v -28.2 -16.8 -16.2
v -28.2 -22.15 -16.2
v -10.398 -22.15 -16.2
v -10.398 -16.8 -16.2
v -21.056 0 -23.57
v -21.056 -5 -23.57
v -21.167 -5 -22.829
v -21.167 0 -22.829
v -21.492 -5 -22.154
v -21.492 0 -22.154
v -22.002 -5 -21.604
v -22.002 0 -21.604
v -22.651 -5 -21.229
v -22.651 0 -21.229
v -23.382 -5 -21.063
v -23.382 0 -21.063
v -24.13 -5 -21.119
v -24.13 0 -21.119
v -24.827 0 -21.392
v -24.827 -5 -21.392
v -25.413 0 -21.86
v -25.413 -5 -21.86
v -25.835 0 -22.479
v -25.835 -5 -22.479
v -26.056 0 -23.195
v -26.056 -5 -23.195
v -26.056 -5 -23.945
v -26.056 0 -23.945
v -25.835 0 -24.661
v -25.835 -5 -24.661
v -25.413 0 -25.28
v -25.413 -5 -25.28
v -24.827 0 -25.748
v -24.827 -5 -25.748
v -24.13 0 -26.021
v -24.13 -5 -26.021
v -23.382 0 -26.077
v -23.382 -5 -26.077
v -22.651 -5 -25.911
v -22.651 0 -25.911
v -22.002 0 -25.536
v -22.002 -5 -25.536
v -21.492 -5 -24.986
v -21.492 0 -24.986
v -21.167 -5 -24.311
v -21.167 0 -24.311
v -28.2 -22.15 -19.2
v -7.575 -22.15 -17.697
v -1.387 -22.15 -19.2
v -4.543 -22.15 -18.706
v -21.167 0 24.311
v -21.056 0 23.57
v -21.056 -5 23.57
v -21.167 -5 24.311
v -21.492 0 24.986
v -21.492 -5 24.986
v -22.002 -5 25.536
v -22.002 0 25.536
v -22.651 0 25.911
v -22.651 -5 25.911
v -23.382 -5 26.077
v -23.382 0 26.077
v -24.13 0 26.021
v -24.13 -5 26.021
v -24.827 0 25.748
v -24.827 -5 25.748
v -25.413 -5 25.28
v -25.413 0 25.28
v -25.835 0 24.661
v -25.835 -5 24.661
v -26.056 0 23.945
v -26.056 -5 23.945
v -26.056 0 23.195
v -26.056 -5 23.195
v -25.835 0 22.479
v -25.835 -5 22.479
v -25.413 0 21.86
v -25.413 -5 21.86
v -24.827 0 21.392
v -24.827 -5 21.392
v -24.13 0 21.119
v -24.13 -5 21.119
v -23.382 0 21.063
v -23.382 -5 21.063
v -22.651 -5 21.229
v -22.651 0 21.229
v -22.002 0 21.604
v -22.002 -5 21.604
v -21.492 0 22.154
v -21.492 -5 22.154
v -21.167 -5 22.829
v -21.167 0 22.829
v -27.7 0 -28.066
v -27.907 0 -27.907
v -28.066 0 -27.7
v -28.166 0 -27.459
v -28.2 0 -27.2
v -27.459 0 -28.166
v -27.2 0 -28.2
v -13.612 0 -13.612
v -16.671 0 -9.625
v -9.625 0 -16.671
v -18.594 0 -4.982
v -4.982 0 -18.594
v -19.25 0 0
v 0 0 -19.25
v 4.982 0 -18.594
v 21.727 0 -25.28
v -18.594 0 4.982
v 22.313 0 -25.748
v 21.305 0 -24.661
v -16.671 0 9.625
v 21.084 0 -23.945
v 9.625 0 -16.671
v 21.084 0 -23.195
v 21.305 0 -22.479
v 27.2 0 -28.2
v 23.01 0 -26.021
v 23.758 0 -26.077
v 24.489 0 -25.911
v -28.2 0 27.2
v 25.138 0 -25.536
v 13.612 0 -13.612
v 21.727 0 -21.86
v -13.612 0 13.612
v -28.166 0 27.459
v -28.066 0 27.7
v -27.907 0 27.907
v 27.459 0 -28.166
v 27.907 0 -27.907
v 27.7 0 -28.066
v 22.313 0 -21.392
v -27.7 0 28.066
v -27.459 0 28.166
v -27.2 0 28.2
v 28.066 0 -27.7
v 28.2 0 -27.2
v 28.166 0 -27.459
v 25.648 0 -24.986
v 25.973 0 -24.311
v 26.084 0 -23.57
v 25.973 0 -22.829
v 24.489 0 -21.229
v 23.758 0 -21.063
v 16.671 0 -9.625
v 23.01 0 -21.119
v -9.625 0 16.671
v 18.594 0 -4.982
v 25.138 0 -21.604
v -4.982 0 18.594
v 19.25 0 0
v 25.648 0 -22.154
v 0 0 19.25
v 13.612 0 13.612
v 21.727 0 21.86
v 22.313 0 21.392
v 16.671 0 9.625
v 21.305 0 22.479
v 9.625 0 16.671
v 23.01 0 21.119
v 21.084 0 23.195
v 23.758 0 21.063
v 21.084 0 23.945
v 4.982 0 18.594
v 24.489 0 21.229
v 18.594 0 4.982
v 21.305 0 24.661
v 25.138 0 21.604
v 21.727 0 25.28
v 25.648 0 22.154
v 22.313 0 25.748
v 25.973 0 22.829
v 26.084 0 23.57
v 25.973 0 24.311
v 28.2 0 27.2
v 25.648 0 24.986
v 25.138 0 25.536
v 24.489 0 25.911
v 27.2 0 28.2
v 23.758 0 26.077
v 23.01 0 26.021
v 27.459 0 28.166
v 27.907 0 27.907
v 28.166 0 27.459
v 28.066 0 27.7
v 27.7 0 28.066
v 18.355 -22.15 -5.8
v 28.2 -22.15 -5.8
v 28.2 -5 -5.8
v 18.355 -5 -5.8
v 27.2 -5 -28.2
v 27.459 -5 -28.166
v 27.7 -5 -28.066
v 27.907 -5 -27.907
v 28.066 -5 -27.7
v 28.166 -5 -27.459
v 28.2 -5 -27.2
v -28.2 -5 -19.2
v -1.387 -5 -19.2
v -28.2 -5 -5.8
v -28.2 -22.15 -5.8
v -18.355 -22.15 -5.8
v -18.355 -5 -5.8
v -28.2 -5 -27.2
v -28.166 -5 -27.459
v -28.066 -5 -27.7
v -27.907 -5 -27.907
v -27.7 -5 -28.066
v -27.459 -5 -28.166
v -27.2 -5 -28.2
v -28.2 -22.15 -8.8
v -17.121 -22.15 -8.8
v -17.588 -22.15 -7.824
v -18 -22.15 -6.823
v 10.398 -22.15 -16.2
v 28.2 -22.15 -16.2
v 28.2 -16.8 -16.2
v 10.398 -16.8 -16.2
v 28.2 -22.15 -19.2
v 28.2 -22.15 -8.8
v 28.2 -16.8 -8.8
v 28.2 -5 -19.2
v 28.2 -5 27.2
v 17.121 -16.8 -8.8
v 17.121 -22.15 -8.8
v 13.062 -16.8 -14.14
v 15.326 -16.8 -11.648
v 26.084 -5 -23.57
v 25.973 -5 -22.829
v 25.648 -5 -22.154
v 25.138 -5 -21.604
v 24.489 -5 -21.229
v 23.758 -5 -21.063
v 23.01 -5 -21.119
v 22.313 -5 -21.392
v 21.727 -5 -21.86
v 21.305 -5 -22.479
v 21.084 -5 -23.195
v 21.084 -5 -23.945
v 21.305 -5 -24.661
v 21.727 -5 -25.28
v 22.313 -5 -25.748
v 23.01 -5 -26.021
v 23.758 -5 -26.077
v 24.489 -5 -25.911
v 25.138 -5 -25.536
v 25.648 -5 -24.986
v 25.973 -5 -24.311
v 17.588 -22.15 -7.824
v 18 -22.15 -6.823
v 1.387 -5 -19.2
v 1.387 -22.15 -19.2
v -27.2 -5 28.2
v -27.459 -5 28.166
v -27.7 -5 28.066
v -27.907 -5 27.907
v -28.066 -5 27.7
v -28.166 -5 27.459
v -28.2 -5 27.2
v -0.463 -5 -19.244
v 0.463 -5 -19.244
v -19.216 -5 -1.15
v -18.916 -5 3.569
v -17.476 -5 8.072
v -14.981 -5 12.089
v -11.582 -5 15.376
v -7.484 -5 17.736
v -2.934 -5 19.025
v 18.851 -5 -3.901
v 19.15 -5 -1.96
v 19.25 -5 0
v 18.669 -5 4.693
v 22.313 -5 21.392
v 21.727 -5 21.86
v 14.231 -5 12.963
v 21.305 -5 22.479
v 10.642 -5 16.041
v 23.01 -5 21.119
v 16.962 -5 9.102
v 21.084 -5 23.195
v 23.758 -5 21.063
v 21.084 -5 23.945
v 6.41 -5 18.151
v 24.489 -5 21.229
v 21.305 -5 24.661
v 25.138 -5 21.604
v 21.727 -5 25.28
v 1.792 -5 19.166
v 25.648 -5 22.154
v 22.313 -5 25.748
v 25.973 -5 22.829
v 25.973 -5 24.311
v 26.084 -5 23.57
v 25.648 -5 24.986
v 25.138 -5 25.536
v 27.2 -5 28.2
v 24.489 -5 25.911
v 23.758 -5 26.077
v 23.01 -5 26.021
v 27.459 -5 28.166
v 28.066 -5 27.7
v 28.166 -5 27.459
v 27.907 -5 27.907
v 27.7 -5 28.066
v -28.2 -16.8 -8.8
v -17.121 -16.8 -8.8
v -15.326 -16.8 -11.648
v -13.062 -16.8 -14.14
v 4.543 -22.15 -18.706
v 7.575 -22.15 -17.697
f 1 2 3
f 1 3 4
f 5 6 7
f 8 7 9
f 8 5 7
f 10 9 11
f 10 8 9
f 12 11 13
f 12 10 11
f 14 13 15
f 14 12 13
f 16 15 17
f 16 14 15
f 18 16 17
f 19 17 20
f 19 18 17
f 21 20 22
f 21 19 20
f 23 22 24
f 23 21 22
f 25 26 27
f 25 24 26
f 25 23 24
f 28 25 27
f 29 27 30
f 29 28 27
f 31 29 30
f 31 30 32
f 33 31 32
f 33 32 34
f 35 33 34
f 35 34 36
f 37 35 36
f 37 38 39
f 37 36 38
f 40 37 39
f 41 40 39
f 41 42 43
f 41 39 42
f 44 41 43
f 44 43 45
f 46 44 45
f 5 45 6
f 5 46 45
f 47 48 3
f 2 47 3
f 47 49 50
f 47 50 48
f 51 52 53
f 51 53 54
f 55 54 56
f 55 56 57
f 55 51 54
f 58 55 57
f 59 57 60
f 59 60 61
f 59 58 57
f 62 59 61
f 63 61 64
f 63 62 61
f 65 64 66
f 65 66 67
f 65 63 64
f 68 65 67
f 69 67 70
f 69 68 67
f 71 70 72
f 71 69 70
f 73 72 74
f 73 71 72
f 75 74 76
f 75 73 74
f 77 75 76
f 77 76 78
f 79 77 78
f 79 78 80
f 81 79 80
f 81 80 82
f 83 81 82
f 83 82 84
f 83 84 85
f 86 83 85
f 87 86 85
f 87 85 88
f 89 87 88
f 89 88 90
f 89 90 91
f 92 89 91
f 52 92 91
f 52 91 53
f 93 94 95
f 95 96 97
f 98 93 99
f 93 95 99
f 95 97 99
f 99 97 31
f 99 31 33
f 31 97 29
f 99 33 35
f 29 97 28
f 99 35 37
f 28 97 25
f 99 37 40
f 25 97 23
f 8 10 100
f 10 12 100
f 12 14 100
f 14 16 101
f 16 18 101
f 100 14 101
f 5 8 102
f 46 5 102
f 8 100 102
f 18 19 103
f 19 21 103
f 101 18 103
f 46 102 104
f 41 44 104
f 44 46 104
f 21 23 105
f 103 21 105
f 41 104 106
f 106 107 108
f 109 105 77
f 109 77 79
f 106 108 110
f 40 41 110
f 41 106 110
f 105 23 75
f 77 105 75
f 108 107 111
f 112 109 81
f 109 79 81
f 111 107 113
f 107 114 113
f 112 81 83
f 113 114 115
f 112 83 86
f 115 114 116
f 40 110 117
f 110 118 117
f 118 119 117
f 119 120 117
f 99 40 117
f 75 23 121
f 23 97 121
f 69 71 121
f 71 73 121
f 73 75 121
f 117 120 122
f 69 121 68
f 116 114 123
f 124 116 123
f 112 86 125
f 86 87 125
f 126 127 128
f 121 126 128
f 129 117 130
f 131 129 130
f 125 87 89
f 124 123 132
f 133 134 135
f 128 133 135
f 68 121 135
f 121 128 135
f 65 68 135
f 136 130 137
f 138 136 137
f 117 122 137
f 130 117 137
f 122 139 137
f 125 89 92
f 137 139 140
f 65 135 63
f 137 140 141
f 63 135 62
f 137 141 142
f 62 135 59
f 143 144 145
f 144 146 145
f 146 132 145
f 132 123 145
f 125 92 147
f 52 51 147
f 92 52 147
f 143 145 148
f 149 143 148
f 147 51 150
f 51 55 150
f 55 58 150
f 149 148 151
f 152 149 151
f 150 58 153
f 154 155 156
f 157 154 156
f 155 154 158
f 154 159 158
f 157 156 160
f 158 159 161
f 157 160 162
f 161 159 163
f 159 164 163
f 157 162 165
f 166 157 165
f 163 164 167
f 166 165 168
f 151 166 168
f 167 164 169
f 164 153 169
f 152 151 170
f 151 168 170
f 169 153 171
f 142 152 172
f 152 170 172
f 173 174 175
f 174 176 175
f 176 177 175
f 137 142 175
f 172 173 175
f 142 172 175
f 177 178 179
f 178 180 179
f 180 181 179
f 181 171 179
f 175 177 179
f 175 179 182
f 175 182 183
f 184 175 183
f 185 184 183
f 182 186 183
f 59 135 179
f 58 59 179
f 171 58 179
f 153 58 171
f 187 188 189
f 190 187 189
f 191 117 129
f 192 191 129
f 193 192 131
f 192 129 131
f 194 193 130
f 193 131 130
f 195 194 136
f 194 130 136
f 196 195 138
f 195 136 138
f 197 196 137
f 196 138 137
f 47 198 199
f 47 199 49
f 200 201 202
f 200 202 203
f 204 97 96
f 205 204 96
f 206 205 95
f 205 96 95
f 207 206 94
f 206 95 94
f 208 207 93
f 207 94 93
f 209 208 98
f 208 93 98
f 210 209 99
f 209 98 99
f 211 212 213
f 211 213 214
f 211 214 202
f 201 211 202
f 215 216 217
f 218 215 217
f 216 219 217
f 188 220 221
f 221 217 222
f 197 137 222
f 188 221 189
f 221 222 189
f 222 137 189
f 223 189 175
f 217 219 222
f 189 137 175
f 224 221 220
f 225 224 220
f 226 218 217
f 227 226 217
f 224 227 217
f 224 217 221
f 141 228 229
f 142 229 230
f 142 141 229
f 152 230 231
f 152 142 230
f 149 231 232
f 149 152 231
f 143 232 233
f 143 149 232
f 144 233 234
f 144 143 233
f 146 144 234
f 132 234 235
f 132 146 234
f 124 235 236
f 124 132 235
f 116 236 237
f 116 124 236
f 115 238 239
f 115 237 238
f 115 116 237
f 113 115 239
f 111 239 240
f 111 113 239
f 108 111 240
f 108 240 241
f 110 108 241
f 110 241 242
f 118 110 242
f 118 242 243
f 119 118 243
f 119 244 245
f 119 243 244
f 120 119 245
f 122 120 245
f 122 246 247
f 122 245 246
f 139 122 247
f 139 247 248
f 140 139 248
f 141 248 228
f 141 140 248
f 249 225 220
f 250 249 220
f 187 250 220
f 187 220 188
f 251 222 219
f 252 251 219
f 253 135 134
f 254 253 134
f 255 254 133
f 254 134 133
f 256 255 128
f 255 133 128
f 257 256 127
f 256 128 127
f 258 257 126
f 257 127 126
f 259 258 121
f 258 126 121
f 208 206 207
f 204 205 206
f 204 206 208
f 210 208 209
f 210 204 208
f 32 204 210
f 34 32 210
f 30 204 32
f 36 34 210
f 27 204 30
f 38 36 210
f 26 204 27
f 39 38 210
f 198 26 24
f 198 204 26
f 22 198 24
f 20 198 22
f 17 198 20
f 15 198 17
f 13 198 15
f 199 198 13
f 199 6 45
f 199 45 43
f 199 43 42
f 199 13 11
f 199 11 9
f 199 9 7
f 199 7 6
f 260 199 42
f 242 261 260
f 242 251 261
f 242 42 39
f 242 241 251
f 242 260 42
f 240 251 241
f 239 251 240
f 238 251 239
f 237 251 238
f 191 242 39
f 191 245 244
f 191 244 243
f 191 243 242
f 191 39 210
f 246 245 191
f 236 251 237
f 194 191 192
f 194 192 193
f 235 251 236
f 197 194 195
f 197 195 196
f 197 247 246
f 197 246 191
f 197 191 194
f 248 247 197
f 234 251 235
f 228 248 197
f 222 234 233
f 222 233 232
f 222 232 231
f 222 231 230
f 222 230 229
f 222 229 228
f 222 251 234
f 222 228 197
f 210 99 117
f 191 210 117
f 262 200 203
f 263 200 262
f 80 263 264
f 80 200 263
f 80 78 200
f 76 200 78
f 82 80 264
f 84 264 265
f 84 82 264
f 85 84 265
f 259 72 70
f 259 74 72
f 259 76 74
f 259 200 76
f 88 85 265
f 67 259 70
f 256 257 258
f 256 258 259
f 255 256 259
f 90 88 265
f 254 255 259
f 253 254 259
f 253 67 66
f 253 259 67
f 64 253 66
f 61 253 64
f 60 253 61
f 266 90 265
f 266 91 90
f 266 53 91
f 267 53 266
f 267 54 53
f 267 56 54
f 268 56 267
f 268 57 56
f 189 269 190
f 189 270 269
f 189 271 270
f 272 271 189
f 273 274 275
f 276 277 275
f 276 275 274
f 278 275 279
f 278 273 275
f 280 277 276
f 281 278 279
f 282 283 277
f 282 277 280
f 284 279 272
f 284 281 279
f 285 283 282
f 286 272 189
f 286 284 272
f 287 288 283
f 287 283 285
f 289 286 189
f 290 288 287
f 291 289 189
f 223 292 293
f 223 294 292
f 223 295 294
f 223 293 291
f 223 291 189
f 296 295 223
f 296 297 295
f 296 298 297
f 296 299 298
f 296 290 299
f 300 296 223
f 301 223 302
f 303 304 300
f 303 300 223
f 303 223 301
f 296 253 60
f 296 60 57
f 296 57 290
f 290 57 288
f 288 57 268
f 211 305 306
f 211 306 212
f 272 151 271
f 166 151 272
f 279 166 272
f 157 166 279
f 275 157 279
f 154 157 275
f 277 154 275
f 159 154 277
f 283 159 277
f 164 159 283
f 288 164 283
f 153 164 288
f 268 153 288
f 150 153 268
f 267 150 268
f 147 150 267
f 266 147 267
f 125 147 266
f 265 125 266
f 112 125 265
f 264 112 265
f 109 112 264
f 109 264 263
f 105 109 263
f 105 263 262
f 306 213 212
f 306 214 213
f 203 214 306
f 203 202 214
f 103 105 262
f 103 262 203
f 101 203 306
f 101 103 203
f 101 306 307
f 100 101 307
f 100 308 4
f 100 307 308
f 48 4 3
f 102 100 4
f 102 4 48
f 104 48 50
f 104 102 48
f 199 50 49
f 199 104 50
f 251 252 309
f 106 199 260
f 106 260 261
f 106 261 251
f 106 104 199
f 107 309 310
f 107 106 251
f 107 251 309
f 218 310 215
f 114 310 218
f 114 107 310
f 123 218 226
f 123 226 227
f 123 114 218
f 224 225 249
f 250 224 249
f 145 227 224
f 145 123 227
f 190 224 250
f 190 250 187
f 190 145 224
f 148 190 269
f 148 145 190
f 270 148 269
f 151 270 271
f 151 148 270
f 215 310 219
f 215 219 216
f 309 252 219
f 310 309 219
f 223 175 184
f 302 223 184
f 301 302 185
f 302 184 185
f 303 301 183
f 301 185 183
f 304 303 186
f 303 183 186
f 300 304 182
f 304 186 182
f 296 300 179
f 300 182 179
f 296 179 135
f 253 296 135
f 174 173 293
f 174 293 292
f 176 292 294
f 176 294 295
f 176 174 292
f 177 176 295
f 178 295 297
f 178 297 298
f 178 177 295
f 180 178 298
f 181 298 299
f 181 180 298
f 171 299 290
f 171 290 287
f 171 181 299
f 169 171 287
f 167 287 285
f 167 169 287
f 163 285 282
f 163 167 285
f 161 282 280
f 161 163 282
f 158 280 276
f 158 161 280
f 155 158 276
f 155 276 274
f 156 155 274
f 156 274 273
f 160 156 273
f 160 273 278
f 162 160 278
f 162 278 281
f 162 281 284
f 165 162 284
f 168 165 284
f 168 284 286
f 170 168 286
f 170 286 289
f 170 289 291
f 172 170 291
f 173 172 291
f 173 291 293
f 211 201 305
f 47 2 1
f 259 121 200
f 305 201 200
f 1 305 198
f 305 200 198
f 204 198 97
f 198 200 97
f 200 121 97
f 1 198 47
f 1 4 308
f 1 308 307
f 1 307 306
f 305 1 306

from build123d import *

# Parameters (mm, degrees)
F0_R          = 2.5144921482
F0_R_2        = 19.25
F1_DEPTH      = 5
F4_END_RADIUS = 19.25
F4_REACH      = 78.1652482066


with BuildPart() as f1:
    # F0 (on Front) → F1 (new body)
    with BuildSketch(Plane.XZ):
        with BuildLine():
            Line((-27.2, -28.2), (27.2, -28.2))
            ThreePointArc((27.2, -28.2), (27.9071067812, -27.9071067812), (28.2, -27.2))
            Line((28.2, -27.2), (28.2, 27.2))
            ThreePointArc((28.2, 27.2), (27.9071067812, 27.9071067812), (27.2, 28.2))
            Line((27.2, 28.2), (-27.2, 28.2))
            ThreePointArc((-27.2, 28.2), (-27.9071067812, 27.9071067812), (-28.2, 27.2))
            Line((-28.2, 27.2), (-28.2, -27.2))
            ThreePointArc((-28.2, -27.2), (-27.9071067812, -27.9071067812), (-27.2, -28.2))
        make_face()
        with Locations((-23.57, -23.57)):
            Circle(F0_R, mode=Mode.SUBTRACT)
        with Locations((23.57, -23.57)):
            Circle(F0_R, mode=Mode.SUBTRACT)
        with Locations((-23.57, 23.57)):
            Circle(F0_R, mode=Mode.SUBTRACT)
        Circle(F0_R_2, mode=Mode.SUBTRACT)
        with Locations((23.57, 23.57)):
            Circle(F0_R, mode=Mode.SUBTRACT)
    extrude(amount=F1_DEPTH)

    f4_end = (Plane.ZX.offset(-2.5) * Cylinder(F4_END_RADIUS, 316.1669127895, mode=Mode.PRIVATE)).faces().sort_by_distance((-19.25, -2.5, 0))[0]
    # F3 (on face) → F4 (join, up to the whole of a round face its end follows)
    with BuildSketch(Plane(origin=(-28.2, 0, 0), x_dir=(0, -1, 0), z_dir=(-1, 0, 0))):
        Polygon((4.9999998882, -16.2), (4.9999998882, -19.2), (22.1499998882, -19.2), (22.1499998882, -16.2), (21.9999998882, -16.2), (16.7999998882, -16.2), (16.7999998882, -8.8), (22.1499998882, -8.8), (22.1499998882, -5.8), (4.9999998882, -5.8), align=None)
    f4_long = extrude(amount=-F4_REACH, mode=Mode.PRIVATE)
    add(split(f4_long, bisect_by=f4_end, keep=Keep.ALL, mode=Mode.PRIVATE).solids().sort_by_distance((-28.2, -12.347048043, -12.5))[0])

    # F5: F1 across plane


with BuildPart() as f1_1:
    add(f1.part)
    add(f1.part.mirror(Plane.YZ))


solid = f1_1.part
